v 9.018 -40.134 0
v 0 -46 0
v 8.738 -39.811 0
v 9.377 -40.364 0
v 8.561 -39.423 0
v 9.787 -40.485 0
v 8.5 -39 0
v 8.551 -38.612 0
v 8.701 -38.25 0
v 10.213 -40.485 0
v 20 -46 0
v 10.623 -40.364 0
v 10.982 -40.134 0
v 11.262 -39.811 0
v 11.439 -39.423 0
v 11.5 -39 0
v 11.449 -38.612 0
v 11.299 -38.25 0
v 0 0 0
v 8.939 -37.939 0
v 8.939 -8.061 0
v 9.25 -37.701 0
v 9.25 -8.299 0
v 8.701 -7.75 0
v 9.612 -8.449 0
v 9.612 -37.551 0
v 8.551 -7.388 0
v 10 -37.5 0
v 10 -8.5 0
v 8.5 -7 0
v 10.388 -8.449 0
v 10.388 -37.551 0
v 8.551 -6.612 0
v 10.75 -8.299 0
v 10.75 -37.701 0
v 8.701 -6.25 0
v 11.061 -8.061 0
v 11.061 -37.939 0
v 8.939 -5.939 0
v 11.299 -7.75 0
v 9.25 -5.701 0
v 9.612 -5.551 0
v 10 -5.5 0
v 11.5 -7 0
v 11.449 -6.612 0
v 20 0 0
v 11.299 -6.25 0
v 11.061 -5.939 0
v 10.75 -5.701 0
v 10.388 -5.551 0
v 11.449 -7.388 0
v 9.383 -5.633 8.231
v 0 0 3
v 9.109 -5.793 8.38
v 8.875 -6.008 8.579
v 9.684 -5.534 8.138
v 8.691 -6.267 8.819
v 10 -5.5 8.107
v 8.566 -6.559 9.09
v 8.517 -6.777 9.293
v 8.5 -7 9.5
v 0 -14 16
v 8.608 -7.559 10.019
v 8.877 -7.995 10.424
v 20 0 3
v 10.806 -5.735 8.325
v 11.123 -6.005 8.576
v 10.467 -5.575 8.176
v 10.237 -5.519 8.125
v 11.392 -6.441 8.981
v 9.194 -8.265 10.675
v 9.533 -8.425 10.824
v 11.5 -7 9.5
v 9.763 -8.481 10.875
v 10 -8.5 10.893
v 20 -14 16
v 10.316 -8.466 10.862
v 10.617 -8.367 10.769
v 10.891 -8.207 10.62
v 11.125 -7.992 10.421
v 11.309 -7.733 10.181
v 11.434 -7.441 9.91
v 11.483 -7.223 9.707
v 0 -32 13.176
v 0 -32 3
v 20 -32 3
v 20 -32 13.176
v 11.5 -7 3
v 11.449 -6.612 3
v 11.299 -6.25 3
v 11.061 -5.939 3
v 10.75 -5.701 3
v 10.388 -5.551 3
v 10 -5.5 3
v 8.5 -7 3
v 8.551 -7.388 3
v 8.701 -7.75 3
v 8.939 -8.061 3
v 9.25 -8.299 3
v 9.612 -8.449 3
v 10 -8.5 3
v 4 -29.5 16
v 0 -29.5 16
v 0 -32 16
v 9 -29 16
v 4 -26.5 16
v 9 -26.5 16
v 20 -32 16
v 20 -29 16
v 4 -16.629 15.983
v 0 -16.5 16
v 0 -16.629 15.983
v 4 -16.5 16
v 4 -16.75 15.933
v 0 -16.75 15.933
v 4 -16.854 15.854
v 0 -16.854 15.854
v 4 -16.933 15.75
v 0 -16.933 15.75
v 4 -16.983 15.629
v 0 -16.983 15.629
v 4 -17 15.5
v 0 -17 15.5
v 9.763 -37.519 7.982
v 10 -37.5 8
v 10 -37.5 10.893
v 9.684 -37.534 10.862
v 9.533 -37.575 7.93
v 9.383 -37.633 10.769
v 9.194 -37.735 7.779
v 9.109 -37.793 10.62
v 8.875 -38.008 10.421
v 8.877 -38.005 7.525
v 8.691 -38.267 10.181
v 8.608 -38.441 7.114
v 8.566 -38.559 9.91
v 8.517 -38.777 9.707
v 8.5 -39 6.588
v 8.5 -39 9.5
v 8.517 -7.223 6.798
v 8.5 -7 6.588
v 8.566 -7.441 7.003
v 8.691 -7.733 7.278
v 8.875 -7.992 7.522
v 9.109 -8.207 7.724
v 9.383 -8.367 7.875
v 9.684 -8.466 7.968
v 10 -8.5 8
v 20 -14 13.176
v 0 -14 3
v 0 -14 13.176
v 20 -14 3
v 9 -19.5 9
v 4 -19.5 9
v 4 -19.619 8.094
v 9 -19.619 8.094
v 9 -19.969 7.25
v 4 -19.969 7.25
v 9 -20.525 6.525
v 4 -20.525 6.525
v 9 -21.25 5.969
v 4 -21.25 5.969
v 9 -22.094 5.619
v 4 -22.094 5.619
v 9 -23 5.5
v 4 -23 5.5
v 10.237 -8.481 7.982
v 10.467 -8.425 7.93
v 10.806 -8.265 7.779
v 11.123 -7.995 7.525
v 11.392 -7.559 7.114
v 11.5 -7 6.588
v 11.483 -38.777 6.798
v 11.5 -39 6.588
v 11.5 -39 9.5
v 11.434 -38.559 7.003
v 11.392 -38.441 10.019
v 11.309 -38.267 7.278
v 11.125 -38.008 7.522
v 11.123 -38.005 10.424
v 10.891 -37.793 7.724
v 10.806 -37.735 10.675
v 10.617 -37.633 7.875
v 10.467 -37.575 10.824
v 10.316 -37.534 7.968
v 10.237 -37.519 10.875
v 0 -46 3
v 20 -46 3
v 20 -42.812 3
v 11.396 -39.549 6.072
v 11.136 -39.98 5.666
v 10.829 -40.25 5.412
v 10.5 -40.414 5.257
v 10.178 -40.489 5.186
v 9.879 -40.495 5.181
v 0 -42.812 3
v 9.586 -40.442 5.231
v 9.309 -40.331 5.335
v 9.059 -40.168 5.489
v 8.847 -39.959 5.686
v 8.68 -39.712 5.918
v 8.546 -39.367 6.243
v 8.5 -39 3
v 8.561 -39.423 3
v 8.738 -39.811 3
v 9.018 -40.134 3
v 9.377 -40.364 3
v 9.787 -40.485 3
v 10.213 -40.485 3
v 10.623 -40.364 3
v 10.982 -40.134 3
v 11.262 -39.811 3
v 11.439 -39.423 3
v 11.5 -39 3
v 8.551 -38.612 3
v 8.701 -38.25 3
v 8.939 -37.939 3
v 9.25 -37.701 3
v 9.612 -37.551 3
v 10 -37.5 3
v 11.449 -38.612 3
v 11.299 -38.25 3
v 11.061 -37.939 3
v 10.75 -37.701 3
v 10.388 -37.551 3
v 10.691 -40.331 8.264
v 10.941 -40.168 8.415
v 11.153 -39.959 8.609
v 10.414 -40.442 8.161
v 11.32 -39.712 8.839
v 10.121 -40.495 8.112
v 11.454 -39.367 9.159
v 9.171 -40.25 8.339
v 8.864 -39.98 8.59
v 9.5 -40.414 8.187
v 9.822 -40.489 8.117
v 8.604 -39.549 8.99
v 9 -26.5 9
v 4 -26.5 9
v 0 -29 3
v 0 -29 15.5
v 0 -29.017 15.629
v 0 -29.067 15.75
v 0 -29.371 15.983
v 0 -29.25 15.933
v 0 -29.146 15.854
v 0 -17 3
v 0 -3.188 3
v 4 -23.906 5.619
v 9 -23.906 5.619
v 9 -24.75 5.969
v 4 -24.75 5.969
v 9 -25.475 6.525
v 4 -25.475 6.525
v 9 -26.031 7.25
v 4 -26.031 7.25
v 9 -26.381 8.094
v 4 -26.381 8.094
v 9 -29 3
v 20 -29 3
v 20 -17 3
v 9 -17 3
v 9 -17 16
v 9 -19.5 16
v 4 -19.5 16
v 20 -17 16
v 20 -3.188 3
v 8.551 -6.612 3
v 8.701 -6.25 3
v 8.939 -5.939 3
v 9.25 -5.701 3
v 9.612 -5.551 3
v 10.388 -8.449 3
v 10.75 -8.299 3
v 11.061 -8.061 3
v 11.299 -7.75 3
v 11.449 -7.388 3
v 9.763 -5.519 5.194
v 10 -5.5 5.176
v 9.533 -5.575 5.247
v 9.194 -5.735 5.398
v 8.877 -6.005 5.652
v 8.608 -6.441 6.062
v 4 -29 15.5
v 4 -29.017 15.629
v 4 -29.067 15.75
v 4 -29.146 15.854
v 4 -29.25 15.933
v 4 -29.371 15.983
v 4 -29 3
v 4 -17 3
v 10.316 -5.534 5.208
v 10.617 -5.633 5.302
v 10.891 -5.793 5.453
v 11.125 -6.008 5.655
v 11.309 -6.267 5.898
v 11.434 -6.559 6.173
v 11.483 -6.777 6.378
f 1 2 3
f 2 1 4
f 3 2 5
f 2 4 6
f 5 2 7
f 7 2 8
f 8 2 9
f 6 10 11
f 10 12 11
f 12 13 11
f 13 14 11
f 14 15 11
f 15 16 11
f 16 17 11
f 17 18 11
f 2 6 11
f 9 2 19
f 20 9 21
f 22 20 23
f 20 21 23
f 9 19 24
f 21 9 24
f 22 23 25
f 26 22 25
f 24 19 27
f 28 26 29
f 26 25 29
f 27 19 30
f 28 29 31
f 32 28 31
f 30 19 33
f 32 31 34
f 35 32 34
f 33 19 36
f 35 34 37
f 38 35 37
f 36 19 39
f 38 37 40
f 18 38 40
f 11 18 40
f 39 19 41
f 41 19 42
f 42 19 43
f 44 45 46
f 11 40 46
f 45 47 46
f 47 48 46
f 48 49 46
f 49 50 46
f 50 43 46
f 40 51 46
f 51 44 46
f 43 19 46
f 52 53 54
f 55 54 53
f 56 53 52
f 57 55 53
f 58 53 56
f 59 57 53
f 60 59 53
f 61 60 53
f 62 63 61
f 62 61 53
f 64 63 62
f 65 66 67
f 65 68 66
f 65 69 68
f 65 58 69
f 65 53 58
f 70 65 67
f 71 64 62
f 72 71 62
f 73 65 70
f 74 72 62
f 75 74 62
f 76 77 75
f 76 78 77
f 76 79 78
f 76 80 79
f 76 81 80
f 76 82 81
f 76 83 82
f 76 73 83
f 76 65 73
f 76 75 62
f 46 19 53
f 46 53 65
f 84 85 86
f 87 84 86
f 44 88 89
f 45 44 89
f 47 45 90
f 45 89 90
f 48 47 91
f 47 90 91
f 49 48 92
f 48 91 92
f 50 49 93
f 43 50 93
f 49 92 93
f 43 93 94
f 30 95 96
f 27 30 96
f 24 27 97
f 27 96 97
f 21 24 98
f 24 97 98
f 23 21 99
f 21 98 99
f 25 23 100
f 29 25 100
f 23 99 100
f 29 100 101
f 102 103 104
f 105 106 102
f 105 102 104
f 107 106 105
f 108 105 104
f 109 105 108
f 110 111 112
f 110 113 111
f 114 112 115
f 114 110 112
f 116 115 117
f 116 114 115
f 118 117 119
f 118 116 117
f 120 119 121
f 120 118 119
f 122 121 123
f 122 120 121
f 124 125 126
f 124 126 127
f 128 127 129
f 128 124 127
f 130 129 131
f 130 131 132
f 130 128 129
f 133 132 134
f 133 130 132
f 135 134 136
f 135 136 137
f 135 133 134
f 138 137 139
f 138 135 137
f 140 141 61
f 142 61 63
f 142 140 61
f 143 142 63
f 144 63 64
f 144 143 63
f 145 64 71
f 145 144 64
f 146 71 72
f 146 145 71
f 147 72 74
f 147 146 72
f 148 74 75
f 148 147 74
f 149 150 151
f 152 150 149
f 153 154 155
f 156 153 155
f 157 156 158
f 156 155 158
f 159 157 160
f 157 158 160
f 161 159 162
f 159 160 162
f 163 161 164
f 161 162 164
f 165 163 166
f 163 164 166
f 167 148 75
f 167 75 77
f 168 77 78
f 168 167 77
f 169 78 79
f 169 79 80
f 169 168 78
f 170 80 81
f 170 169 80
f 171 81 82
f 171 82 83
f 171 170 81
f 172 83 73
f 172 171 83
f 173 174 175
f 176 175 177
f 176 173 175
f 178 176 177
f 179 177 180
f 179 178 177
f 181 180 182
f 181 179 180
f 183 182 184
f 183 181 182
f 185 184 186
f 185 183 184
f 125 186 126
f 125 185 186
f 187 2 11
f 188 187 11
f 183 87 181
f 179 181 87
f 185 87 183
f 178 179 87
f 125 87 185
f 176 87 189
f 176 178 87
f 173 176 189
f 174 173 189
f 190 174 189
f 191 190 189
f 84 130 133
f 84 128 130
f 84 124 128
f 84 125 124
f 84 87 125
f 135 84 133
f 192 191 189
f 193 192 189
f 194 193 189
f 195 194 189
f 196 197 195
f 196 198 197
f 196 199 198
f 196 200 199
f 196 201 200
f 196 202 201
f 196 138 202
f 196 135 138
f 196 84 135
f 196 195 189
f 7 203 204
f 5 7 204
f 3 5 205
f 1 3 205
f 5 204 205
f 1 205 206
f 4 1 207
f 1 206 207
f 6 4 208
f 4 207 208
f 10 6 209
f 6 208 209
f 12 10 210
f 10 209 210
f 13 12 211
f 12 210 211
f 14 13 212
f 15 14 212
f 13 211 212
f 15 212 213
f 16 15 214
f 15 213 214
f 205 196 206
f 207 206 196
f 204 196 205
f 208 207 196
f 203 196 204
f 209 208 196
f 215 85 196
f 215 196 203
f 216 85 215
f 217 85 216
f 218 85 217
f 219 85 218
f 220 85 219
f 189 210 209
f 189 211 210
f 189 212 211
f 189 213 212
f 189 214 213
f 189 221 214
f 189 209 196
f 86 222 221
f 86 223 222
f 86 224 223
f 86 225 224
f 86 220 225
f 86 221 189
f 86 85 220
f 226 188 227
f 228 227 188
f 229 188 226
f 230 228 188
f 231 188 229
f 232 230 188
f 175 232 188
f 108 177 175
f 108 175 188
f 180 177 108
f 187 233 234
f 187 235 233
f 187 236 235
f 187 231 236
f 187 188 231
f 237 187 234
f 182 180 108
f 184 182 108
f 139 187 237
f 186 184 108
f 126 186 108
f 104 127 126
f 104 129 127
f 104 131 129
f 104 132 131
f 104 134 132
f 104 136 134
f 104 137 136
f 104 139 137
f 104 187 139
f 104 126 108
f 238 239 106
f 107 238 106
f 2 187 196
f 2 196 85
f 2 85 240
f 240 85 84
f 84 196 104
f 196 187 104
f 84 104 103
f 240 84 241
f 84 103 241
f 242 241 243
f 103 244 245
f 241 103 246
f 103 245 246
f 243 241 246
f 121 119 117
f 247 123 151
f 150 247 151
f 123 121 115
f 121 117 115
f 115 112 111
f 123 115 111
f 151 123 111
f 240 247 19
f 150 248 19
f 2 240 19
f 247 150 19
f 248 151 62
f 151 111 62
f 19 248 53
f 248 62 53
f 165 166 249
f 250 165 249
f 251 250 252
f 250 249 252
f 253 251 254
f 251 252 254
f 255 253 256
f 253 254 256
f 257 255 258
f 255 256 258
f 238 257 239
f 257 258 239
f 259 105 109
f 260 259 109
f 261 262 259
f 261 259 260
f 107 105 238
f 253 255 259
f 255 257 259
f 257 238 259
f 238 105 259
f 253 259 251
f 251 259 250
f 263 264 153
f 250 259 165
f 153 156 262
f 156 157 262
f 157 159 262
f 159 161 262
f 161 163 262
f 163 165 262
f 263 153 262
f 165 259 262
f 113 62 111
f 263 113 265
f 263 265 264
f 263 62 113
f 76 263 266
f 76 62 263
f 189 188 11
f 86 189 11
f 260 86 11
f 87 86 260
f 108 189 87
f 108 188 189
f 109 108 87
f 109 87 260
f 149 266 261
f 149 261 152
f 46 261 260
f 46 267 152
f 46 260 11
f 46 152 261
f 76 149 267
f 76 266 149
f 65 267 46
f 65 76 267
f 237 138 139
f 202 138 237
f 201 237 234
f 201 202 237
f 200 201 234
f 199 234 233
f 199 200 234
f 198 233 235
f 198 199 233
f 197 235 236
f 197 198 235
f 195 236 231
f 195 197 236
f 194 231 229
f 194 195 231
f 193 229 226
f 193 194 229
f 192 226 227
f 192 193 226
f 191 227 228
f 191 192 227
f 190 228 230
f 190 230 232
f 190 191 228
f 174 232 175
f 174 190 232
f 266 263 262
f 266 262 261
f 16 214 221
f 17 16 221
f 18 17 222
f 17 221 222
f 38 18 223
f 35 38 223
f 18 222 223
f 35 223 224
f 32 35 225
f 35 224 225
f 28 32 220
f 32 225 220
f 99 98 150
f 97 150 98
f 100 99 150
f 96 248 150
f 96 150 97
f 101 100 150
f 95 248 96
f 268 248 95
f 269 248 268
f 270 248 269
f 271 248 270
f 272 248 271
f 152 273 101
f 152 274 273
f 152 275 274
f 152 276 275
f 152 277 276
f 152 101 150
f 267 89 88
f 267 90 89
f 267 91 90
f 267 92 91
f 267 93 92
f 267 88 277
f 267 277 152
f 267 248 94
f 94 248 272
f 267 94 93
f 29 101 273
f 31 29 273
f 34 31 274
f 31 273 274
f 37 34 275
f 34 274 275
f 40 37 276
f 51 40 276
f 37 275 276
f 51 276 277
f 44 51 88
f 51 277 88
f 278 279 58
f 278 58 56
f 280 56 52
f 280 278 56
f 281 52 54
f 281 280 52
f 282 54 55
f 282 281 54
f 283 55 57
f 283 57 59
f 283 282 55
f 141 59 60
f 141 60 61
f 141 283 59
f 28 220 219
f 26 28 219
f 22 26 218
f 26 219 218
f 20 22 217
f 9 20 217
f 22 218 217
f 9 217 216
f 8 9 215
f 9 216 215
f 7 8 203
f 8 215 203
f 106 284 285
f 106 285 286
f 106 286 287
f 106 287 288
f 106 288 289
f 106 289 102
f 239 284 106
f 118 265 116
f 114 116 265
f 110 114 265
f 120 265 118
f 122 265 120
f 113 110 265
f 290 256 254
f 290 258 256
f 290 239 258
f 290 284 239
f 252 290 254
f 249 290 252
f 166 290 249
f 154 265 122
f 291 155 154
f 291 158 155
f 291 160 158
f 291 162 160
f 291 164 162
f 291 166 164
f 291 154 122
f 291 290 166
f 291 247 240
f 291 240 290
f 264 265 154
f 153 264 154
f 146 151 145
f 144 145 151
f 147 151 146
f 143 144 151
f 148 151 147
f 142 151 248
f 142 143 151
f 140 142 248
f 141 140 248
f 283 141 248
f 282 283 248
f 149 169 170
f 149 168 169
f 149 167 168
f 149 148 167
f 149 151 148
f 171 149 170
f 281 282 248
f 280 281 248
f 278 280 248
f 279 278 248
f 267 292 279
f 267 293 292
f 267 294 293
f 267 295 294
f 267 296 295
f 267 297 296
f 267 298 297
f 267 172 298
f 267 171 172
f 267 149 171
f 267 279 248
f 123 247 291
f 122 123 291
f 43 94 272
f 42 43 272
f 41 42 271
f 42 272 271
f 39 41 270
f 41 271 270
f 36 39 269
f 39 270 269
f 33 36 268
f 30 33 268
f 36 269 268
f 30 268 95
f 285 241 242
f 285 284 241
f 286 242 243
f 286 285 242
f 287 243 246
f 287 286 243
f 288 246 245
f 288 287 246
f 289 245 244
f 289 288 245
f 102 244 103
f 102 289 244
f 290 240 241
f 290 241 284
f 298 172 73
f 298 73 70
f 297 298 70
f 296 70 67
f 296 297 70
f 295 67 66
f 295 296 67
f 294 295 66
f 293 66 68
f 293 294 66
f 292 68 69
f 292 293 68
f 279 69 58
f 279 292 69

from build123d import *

# Parameters (mm, degrees)
F0_W      = 20
F0_H      = 46
F1_DEPTH  = 3
F2_W      = 20
F2_H      = 3
F3_DEPTH  = 13
F6_DEPTH  = 25
F7_DEPTH  = 25
F9_DEPTH  = 20
F11_DEPTH = 20
F12_DEPTH = 25
F13_DEPTH = 25
F14_W     = 5
F14_H     = 12
F15_DEPTH = 13
F17_DEPTH = 25
F18_R     = 0.5


# Not quite as in the source:
# - ends of sketch curves that miss each other by under 0.0002 mm in the source are joined


with BuildPart() as f1:
    # F0 (on Top) → F1 (new body)
    with BuildSketch(Plane.XY):
        with Locations((10, -23)):
            Rectangle(F0_W, F0_H)
    extrude(amount=F1_DEPTH)

    # F2 (on face) → F3 (join)
    with BuildSketch(Plane.XY.offset(3)):
        with Locations((10, -15.5)):
            Rectangle(F2_W, F2_H)
        with Locations((10, -30.5)):
            Rectangle(F2_W, F2_H)
    extrude(amount=F3_DEPTH)

    # F5 (on face) → F6 (cut)
    with BuildSketch(Plane.XY.offset(3)):
        with BuildLine():
            Line((10, -39), (8.5, -39))
            ThreePointArc((8.5, -39), (10, -40.5), (11.5, -39))
            ThreePointArc((11.5, -39), (11.0606601718, -37.9393398282), (10, -37.5))
            Line((10, -37.5), (10, -39))
        make_face()
        with BuildLine():
            ThreePointArc((10, -37.5), (8.9393398282, -37.9393398282), (8.5, -39))
            Line((8.5, -39), (10, -39))
            Line((10, -39), (10, -37.5))
        make_face()
    extrude(amount=-F6_DEPTH, mode=Mode.SUBTRACT)

    # F5 (on face) → F7 (cut)
    with BuildSketch(Plane.XY.offset(3)):
        with BuildLine():
            ThreePointArc((11.5000007078, -7), (11.0606608796, -5.9393398282), (10.0000007078, -5.5))
            Line((10.0000007078, -5.5), (10.0000007078, -7))
            Line((10.0000007078, -7), (10, -8.5))
            ThreePointArc((10, -8.5), (11.0606606293, -8.060660422), (11.5000007078, -7))
        make_face()
        with BuildLine():
            Line((10.0000007078, -7), (8.5000007078, -7))
            ThreePointArc((8.5000007078, -7), (8.9393402858, -8.0606599215), (10, -8.5))
            Line((10, -8.5), (10.0000007078, -7))
        make_face()
        with BuildLine():
            Line((10.0000007078, -7), (10.0000007078, -5.5))
            ThreePointArc((10.0000007078, -5.5), (8.939340536, -5.9393398282), (8.5000007078, -7))
            Line((8.5000007078, -7), (10.0000007078, -7))
        make_face()
    extrude(amount=-F7_DEPTH, mode=Mode.SUBTRACT)

    # F8 (on face) → F9 (join)
    with BuildSketch(Plane(origin=(0, 0, 0), x_dir=(0, -1, 0), z_dir=(-1, 0, 0))):
        Polygon((46, 3), (32, 16), (29, 16), (46, 0), align=None)
    extrude(amount=-F9_DEPTH)

    # F10 (on face) → F11 (join)
    with BuildSketch(Plane.YZ.offset(20)):
        Polygon((0, 3), (-14, 16), (-14, 13.1764705882), (-3.1875, 3), align=None)
    extrude(amount=-F11_DEPTH)

    # F5 (on face) → F12 (cut)
    with BuildSketch(Plane.XY.offset(3)):
        with BuildLine():
            Line((10, -39), (8.5, -39))
            ThreePointArc((8.5, -39), (10, -40.5), (11.5, -39))
            ThreePointArc((11.5, -39), (11.0606601718, -37.9393398282), (10, -37.5))
            Line((10, -37.5), (10, -39))
        make_face()
        with BuildLine():
            ThreePointArc((10, -37.5), (8.9393398282, -37.9393398282), (8.5, -39))
            Line((8.5, -39), (10, -39))
            Line((10, -39), (10, -37.5))
        make_face()
    extrude(amount=F12_DEPTH, mode=Mode.SUBTRACT)

    # F5 (on face) → F13 (cut)
    with BuildSketch(Plane.XY.offset(3)):
        with BuildLine():
            ThreePointArc((11.5000007078, -7), (11.0606608796, -5.9393398282), (10.0000007078, -5.5))
            Line((10.0000007078, -5.5), (10.0000007078, -7))
            Line((10.0000007078, -7), (10, -8.5))
            ThreePointArc((10, -8.5), (11.0606606293, -8.060660422), (11.5000007078, -7))
        make_face()
        with BuildLine():
            Line((10.0000007078, -7), (8.5000007078, -7))
            ThreePointArc((8.5000007078, -7), (8.9393402858, -8.0606599215), (10, -8.5))
            Line((10, -8.5), (10.0000007078, -7))
        make_face()
        with BuildLine():
            Line((10.0000007078, -7), (10.0000007078, -5.5))
            ThreePointArc((10.0000007078, -5.5), (8.939340536, -5.9393398282), (8.5000007078, -7))
            Line((8.5000007078, -7), (10.0000007078, -7))
        make_face()
    extrude(amount=F13_DEPTH, mode=Mode.SUBTRACT)

    # F14 (on face) → F15 (join)
    with BuildSketch(Plane.XY.offset(3)):
        with Locations((6.5, -23)):
            Rectangle(F14_W, F14_H)
    extrude(amount=F15_DEPTH)

    # F16 (on face) → F17 (cut)
    with BuildSketch(Plane(origin=(4, 0, 0), x_dir=(0, -1, 0), z_dir=(-1, 0, 0))):
        with BuildLine():
            Line((19.5, 16), (19.5, 9))
            ThreePointArc((19.5, 9), (23, 12.5), (26.5, 9))
            Line((26.5, 9), (26.5, 16))
            Line((26.5, 16), (19.5, 16))
        make_face()
        with BuildLine():
            ThreePointArc((26.5, 9), (23, 12.5), (19.5, 9))
            Line((19.5, 9), (23, 9))
            Line((23, 9), (26.5, 9))
        make_face()
        with BuildLine():
            ThreePointArc((19.5, 9), (20.5251262658, 6.5251262658), (23, 5.5))
            Line((23, 5.5), (23, 9))
            Line((23, 9), (19.5, 9))
        make_face()
        with BuildLine():
            Line((23, 9), (23, 5.5))
            ThreePointArc((23, 5.5), (25.4748737342, 6.5251262658), (26.5, 9))
            Line((26.5, 9), (23, 9))
        make_face()
    extrude(amount=-F17_DEPTH, mode=Mode.SUBTRACT)

    # F18
    f18_edges = [f1.edges().sort_by_distance(p)[0] for p in [
        (2, -17, 16),
        (2, -29, 16),
    ]]
    fillet(f18_edges, radius=F18_R)


solid = f1.part
